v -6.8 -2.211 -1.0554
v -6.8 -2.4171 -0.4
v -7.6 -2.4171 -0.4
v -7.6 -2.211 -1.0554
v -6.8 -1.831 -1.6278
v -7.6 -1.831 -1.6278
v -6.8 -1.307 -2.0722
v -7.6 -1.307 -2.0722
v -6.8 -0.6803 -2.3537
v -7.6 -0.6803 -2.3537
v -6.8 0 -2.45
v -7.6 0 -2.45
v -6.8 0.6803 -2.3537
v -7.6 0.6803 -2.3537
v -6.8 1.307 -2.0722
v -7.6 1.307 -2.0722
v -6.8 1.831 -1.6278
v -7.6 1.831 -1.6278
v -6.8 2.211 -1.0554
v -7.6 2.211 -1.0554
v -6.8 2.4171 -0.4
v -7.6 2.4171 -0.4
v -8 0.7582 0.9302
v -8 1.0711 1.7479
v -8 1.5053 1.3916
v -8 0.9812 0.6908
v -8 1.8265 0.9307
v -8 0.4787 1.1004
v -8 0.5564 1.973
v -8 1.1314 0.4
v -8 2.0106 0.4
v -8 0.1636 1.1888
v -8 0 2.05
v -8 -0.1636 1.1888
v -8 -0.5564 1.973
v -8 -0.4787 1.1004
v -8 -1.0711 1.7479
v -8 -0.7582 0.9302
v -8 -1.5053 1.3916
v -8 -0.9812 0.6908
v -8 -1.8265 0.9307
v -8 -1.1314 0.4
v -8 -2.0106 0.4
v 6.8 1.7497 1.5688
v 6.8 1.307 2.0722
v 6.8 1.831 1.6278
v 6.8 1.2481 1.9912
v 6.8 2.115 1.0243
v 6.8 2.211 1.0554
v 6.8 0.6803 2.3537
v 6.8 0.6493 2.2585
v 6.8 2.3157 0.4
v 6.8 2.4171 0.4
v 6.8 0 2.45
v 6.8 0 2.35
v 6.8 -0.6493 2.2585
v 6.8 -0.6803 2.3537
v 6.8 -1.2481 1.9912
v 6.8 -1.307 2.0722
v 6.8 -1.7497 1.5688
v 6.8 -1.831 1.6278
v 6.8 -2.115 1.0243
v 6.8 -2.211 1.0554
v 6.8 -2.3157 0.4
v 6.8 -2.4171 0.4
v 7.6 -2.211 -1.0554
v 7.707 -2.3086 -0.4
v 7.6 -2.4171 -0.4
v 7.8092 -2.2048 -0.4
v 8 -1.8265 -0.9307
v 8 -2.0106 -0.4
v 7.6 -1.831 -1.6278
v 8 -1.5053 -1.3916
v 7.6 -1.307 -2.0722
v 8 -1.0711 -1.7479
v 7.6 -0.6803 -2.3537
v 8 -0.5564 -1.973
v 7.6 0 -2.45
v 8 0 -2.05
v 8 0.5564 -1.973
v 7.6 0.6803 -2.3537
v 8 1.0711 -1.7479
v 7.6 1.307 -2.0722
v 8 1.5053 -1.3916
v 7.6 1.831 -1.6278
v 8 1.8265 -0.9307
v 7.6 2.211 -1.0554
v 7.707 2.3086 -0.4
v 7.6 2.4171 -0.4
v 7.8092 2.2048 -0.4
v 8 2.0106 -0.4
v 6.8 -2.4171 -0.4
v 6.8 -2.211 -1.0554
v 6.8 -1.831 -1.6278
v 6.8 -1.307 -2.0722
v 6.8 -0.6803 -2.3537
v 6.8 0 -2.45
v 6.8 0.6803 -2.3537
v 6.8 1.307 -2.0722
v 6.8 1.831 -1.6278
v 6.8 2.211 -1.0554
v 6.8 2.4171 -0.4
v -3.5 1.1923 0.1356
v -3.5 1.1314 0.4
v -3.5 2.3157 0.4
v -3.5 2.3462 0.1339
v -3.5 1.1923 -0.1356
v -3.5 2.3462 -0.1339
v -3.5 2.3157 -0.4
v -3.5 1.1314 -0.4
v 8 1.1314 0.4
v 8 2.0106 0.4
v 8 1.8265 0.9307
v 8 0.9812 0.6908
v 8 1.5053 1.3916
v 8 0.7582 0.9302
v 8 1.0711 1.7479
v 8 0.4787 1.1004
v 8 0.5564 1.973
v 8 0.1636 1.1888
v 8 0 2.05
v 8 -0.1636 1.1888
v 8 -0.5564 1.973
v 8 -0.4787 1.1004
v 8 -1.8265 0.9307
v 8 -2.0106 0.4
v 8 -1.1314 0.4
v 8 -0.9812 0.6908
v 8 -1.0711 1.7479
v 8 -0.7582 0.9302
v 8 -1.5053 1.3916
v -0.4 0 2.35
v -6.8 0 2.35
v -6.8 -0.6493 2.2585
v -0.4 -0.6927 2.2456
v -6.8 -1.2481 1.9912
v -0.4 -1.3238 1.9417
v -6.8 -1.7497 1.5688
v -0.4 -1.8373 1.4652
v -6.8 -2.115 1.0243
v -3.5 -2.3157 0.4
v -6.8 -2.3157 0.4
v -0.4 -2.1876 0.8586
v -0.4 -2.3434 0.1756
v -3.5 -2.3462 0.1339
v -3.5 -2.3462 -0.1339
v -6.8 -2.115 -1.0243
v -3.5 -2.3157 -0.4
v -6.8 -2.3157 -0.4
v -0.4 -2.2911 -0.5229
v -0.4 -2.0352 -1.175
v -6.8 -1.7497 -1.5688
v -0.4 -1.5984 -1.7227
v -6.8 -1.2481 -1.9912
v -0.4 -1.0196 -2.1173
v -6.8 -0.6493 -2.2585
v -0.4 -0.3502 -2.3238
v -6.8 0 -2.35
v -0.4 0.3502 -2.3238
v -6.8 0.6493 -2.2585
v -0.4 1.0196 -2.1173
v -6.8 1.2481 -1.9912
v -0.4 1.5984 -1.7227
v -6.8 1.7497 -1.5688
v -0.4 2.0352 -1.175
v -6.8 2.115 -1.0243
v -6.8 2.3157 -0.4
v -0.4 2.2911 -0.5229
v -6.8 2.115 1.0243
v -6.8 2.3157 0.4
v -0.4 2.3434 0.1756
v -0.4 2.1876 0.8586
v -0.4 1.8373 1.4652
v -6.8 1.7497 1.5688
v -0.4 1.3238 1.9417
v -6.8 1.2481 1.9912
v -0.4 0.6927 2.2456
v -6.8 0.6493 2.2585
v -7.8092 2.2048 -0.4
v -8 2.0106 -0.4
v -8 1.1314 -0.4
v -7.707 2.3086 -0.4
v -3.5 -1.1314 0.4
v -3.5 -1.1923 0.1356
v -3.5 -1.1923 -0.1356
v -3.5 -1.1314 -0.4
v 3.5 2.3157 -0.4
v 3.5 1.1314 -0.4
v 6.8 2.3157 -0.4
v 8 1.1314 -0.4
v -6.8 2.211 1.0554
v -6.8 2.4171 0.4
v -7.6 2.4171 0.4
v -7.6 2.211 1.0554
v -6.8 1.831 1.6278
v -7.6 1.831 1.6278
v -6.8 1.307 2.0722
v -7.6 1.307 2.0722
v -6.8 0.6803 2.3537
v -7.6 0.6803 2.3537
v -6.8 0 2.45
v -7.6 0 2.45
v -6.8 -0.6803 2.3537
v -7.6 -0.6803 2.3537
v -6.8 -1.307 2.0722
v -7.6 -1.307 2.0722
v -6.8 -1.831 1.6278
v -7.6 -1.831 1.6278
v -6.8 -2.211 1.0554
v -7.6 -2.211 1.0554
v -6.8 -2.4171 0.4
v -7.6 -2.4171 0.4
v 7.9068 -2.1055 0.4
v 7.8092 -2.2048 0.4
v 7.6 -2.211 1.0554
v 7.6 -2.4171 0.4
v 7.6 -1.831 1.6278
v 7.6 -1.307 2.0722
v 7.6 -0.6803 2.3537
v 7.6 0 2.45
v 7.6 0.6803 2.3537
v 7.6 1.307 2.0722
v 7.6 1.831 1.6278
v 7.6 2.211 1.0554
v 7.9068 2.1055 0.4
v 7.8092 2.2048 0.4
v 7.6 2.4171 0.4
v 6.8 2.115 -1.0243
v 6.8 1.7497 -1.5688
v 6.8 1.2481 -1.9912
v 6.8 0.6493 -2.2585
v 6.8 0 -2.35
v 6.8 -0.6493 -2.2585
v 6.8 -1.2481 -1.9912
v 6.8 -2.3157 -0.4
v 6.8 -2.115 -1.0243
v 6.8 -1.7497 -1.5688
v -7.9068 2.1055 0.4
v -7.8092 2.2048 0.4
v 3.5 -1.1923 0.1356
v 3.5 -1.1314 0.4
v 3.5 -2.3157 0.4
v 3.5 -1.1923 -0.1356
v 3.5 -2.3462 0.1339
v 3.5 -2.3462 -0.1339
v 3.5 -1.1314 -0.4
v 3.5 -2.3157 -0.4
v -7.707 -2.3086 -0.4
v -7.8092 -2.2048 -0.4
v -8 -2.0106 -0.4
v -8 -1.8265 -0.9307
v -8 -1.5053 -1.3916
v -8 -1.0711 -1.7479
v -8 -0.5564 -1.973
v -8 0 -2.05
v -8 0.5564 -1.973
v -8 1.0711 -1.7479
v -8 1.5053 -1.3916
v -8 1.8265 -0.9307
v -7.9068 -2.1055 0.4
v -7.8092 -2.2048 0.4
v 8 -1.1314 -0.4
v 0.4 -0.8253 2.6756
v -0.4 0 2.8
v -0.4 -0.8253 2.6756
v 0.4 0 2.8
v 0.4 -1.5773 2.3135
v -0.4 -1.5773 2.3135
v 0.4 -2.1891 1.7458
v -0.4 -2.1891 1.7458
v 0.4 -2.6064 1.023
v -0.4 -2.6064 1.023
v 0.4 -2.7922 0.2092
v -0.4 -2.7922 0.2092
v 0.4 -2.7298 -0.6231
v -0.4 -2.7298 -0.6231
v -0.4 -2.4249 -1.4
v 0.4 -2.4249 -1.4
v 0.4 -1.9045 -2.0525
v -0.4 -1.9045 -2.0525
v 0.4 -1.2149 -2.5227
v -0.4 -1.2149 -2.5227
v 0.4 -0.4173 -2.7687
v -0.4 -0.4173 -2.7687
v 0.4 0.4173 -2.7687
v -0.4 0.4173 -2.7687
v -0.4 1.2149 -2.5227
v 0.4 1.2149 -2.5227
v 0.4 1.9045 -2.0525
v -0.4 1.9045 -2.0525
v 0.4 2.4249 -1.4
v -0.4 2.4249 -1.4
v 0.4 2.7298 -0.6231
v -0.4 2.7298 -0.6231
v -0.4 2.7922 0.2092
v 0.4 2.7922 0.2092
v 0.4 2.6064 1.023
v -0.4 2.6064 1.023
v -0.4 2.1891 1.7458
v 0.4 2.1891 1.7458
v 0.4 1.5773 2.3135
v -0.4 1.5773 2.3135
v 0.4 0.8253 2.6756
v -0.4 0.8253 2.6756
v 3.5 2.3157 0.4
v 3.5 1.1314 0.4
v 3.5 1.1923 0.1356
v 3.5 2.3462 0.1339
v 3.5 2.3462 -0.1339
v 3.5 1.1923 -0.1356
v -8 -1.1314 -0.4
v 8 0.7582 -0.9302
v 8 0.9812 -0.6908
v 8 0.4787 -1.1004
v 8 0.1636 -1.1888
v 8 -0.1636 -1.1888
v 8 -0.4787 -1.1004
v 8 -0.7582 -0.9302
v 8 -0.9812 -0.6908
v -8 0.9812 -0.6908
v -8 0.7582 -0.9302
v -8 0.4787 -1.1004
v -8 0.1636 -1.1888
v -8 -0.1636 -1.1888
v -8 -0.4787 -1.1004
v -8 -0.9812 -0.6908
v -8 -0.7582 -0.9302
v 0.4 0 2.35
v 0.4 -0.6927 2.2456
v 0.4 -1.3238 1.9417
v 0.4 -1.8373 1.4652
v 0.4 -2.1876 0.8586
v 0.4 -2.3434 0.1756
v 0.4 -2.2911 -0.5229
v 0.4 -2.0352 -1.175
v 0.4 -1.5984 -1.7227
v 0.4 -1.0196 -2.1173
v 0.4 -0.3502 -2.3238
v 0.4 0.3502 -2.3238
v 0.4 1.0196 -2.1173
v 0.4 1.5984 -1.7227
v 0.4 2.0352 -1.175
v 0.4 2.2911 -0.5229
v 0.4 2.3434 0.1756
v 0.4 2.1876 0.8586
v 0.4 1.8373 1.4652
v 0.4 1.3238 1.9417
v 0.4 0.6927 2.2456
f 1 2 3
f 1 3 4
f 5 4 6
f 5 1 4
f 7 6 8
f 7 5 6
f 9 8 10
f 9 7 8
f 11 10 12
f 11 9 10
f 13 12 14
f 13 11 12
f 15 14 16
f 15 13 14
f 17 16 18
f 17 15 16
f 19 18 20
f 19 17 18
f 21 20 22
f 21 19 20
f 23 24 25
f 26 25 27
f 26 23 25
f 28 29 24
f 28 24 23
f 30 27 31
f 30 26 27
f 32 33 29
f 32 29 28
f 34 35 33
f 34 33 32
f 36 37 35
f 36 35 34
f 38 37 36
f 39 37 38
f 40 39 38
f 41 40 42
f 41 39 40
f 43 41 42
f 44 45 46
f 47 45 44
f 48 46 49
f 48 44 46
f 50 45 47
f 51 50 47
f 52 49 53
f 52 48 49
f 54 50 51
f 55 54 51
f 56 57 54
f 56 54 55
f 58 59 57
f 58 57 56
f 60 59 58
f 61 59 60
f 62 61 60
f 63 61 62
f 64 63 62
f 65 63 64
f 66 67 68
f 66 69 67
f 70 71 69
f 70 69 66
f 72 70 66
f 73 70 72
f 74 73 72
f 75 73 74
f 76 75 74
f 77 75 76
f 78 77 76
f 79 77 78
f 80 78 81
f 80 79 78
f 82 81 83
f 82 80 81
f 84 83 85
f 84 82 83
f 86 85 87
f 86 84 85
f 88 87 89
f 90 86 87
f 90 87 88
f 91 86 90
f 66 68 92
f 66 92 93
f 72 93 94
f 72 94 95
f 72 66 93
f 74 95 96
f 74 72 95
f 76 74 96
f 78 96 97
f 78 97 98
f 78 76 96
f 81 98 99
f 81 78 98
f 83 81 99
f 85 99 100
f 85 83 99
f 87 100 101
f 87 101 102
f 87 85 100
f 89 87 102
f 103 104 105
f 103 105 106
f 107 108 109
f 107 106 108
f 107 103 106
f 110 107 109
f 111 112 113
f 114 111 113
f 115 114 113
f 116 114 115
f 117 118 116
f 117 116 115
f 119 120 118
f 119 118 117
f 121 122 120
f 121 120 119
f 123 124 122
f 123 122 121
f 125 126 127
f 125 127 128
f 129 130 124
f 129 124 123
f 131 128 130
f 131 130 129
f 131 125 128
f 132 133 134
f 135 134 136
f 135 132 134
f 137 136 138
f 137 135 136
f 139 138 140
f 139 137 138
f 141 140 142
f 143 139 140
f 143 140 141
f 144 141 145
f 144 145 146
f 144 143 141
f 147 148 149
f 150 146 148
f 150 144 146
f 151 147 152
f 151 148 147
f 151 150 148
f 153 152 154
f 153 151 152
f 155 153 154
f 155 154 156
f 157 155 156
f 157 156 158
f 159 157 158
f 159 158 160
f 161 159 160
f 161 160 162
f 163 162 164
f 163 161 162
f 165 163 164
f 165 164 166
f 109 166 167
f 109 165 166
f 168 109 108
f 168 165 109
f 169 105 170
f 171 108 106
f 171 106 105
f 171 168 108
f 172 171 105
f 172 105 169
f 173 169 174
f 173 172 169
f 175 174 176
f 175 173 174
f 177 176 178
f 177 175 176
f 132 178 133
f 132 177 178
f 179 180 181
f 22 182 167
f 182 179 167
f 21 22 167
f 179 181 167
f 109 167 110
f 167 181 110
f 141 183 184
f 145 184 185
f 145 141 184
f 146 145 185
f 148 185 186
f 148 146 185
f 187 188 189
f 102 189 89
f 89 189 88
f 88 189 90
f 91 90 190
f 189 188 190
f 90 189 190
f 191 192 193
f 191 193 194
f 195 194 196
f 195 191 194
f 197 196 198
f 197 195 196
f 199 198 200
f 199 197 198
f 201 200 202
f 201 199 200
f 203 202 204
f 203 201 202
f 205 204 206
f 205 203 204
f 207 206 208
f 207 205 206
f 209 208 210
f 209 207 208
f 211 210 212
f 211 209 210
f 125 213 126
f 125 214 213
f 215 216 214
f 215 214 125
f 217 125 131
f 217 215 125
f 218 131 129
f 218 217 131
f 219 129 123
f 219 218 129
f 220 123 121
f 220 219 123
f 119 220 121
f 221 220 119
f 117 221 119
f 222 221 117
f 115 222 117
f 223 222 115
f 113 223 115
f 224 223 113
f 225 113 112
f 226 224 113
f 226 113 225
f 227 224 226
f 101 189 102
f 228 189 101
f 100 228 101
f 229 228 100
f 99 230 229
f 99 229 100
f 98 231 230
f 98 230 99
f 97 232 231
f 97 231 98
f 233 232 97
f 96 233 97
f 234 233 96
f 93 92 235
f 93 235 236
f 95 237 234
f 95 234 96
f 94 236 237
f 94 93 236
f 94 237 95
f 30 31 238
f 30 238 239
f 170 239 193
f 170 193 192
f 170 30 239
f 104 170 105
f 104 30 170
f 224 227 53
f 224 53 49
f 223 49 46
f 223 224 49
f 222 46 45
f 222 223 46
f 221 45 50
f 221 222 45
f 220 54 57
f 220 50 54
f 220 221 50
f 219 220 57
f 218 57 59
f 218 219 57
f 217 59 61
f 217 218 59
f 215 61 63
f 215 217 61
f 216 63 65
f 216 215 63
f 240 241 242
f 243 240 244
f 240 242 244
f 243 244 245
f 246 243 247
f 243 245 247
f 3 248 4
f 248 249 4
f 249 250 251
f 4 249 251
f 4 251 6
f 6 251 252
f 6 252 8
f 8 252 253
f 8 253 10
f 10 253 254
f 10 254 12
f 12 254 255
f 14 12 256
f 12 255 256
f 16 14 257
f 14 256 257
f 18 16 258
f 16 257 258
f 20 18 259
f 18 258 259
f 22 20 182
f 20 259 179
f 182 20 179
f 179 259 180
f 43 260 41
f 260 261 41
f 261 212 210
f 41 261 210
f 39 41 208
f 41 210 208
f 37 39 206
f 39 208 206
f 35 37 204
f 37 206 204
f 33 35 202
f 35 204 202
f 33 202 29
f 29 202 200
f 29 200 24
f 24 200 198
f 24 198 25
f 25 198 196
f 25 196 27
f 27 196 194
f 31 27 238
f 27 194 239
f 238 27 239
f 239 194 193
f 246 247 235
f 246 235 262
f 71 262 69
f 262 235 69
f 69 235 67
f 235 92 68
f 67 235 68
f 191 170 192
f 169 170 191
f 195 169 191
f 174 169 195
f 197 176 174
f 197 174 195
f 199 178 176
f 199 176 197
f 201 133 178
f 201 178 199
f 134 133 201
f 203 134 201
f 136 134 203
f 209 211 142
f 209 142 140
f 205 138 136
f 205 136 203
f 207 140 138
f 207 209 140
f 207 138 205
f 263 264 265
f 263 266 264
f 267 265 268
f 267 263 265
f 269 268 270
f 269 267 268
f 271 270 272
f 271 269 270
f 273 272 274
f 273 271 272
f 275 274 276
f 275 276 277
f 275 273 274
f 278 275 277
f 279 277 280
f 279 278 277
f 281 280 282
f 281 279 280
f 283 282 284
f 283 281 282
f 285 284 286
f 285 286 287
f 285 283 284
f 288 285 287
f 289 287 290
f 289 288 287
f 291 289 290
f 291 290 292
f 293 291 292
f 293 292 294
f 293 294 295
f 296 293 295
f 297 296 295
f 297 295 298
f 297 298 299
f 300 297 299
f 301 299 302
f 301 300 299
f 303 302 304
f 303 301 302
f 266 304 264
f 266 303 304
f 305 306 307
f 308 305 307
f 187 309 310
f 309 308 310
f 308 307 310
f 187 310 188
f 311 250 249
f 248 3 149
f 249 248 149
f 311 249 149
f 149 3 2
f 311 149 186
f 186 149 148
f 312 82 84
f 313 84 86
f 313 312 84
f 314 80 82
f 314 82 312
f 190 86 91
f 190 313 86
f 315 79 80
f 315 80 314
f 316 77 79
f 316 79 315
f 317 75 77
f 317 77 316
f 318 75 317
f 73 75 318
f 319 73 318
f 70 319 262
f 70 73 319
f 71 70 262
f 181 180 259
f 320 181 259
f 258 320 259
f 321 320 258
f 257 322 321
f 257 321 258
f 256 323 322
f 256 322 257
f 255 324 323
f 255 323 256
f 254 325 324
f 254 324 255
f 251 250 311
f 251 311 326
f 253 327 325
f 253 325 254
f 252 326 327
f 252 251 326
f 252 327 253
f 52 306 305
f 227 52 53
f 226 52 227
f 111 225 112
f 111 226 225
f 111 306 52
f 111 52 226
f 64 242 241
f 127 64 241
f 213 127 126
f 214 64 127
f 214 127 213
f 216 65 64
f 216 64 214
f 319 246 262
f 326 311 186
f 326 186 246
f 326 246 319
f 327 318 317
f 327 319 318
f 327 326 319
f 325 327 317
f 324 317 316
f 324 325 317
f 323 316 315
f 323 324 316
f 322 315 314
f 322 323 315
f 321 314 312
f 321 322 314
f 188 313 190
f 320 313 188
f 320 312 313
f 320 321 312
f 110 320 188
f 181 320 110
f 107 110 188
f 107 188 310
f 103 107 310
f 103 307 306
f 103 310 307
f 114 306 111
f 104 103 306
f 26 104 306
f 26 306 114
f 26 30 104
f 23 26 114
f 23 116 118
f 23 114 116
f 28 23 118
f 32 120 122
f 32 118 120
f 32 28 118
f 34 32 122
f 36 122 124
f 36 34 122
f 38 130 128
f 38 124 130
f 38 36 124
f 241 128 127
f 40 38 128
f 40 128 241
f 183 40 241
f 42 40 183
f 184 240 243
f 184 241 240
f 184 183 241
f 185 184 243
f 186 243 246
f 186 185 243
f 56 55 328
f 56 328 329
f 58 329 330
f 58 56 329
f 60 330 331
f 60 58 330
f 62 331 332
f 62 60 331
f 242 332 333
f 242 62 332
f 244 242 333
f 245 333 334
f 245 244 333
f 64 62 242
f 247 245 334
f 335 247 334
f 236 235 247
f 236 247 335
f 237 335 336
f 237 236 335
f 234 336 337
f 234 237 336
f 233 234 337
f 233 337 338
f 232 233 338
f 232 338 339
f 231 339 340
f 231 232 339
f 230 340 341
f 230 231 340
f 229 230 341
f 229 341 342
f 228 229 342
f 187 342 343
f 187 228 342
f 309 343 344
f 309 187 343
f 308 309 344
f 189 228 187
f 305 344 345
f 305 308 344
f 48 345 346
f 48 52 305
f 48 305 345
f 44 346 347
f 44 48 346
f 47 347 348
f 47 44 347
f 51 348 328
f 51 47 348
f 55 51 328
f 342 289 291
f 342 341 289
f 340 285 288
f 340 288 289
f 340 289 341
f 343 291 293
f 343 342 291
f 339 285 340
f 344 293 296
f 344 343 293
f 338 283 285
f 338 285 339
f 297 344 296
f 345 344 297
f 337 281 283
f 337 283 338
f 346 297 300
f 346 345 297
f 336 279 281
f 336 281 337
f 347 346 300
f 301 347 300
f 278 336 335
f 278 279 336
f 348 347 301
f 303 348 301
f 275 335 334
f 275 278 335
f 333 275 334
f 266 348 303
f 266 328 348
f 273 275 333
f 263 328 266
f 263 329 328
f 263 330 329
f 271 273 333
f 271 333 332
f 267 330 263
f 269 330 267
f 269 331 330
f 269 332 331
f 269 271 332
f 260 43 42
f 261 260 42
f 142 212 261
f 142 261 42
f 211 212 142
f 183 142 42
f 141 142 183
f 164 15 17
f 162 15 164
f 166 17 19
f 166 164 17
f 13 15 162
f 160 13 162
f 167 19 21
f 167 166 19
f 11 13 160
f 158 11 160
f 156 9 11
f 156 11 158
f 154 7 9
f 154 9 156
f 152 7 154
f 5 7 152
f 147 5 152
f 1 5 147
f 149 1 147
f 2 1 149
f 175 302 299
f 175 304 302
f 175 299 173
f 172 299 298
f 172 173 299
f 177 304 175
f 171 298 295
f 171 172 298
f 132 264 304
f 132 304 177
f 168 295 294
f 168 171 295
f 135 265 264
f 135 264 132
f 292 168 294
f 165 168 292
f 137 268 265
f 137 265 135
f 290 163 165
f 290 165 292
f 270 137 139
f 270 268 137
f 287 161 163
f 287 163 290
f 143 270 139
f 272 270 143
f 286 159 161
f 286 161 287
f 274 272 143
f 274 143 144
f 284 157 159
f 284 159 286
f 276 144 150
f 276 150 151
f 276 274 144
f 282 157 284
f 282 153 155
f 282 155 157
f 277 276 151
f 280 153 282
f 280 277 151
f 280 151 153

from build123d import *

# Parameters (mm, degrees)
CUT_EXTRUDE1_DEPTH      = 9.926365442
CUT_EXTRUDE1_DEPTH_BACK = 9.926365442
SKETCH2_W               = 6.910571645
SKETCH2_H               = 0.8
SKETCH2_W_2             = 6.017195094
CHAMFER1_SIZE           = 0.4
CUT_EXTRUDE2_DEPTH      = 17.482718222
CUT_EXTRUDE2_DEPTH_BACK = 17.482718222
SKETCH3_R               = 1.2


with BuildPart() as part:
    # Sketch1 → Revolve1 (revolve)
    with BuildSketch(Plane.XY, mode=Mode.PRIVATE) as revolve1_sk:
        Polygon((-8, 0), (-8, 2.45), (-6.8, 2.45), (-6.8, 2.35), (-0.4, 2.35), (-0.4, 2.8), (0.4, 2.8), (0.4, 2.35), (6.8, 2.35), (6.8, 2.45), (8, 2.45), (8, 0), align=None)
    revolve(revolve1_sk.sketch.rotate(Axis((-8, 0, 0), (1, 0, 0)), 90), axis=Axis((-8, 0, 0), (1, 0, 0)))

    # Sketch2 → Cut-Extrude1 (cut, two sides: drawn at the far end of the back side and taken through both)
    with BuildSketch(Plane(origin=(0, 0, 0), x_dir=(1, 0, 0), z_dir=(0, 1, 0)).offset(-CUT_EXTRUDE1_DEPTH_BACK)):
        with Locations((-6.955285823, 0)):
            Rectangle(SKETCH2_W, SKETCH2_H)
        with Locations((6.508597547, 0)):
            Rectangle(SKETCH2_W_2, SKETCH2_H)
    extrude(amount=CUT_EXTRUDE1_DEPTH + CUT_EXTRUDE1_DEPTH_BACK, mode=Mode.SUBTRACT)

    # Chamfer1
    chamfer1_edges = [part.edges().sort_by_distance(p)[0] for p in [
        (8, 0, -2.45),
        (8, 0, 2.45),
        (-8, 0, -2.45),
        (-8, 0, 2.45),
    ]]
    chamfer(chamfer1_edges, length=CHAMFER1_SIZE)

    # Sketch3 → Cut-Extrude2 (cut, two sides: drawn at the far end of the back side and taken through both)
    with BuildSketch(Plane(origin=(8, 0, 0), x_dir=(0, 0, -1), z_dir=(1, 0, 0)).offset(-CUT_EXTRUDE2_DEPTH_BACK)):
        with Locations(Location((0, 0, 0), (0, 0, 289.471220634))):
            Circle(SKETCH3_R)
    extrude(amount=CUT_EXTRUDE2_DEPTH + CUT_EXTRUDE2_DEPTH_BACK, mode=Mode.SUBTRACT)


solid = part.part
